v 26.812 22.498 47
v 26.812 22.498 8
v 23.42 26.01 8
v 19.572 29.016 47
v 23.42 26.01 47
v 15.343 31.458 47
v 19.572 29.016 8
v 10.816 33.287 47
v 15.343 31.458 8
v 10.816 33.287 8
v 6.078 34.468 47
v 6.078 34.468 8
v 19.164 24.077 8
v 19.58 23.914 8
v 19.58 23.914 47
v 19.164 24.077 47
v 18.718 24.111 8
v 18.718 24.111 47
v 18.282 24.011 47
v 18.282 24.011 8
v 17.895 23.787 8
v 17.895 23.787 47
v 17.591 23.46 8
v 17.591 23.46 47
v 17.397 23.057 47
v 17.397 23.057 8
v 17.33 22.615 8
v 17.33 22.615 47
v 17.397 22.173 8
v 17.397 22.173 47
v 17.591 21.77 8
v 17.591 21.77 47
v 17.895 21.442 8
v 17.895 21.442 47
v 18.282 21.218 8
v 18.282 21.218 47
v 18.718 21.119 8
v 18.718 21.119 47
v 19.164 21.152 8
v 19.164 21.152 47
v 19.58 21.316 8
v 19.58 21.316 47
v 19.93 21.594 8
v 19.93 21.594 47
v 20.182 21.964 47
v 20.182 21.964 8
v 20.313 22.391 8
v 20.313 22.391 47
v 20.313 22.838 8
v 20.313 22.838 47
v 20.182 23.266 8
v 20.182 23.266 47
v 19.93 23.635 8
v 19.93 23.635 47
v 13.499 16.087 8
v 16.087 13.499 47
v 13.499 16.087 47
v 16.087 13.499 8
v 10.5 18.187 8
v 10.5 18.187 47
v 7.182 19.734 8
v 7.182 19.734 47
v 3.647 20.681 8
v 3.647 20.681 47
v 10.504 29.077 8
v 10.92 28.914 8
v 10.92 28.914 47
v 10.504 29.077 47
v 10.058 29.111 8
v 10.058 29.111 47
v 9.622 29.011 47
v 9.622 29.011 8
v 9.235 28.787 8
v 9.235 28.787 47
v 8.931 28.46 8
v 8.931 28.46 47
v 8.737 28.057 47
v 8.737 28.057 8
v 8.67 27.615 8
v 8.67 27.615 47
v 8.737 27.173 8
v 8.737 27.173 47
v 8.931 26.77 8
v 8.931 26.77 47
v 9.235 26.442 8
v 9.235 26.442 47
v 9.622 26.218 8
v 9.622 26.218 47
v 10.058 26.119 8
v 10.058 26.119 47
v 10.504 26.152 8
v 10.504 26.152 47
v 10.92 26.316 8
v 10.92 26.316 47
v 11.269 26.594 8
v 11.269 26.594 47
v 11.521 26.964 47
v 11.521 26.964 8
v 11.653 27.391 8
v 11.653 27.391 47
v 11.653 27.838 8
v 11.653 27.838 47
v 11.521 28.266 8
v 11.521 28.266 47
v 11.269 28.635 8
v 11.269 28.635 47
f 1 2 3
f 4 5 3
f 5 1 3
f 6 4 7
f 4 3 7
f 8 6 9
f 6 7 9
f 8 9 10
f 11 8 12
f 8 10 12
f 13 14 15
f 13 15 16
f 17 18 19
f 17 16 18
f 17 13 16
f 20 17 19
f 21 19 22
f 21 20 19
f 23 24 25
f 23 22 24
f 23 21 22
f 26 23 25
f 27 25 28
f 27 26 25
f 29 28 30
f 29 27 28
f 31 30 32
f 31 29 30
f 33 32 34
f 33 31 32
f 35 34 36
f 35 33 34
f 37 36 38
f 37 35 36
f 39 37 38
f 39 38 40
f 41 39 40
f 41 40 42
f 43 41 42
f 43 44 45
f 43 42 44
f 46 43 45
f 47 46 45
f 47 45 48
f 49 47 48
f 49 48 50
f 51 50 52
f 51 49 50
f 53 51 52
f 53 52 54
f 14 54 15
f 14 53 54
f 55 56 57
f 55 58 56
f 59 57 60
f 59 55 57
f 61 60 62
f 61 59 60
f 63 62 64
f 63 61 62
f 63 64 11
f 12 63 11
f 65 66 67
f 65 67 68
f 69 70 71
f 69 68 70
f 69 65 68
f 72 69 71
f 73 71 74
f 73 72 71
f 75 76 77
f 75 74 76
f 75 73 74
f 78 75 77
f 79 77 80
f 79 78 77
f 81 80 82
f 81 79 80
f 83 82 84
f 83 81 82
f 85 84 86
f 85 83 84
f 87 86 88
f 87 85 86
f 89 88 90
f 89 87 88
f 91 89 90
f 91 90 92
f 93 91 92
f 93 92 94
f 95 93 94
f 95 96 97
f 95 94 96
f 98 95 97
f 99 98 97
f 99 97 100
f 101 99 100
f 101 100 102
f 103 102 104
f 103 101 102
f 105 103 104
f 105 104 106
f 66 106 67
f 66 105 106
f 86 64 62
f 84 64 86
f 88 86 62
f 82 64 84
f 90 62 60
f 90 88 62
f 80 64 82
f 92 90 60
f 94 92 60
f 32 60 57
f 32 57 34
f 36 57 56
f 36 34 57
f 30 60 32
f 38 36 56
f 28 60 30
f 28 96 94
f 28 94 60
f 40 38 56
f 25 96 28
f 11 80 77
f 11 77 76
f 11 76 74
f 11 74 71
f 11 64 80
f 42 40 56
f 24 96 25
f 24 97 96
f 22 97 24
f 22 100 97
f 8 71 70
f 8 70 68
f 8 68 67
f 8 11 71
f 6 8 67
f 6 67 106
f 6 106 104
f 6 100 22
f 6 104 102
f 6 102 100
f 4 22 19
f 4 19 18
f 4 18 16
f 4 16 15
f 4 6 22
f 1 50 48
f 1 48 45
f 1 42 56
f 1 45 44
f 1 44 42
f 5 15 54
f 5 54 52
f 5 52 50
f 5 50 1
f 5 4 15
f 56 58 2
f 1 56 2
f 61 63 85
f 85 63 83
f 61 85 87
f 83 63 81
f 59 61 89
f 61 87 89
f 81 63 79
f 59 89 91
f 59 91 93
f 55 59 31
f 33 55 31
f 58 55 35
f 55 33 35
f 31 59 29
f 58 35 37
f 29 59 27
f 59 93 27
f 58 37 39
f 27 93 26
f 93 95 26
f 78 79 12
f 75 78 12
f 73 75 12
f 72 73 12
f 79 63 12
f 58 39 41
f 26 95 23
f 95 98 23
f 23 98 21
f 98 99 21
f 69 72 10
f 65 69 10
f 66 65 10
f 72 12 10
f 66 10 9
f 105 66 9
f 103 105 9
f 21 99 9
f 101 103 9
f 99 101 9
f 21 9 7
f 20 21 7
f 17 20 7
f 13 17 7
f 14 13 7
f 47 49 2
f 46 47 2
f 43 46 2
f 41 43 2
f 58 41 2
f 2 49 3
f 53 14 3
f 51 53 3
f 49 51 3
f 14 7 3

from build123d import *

# Parameters (mm, degrees)
CYLINDER222_R               = 1.5
CYLINDER222_DEPTH           = 60
CYLINDER221_R               = 1.5
CYLINDER221_DEPTH           = 60
COMPOUND199_PLACEMENT_ANGLE = 60
BOX092_W                    = 50
BOX092_H                    = 50
BOX092_DEPTH                = 39
BOX092_PLACEMENT_ANGLE      = 80
BOX093_W                    = 50
BOX093_H                    = 50
BOX093_DEPTH                = 39
BOX093_PLACEMENT_ANGLE      = 50
BOX095_W                    = 50
BOX095_H                    = 100
BOX095_DEPTH                = 39
BOX095_PLACEMENT_ANGLE      = 150
BOX094_W                    = 50
BOX094_H                    = 100
BOX094_DEPTH                = 39
BOX094_PLACEMENT_ANGLE      = 240
TUBE017_R                   = 35
TUBE017_R_2                 = 21
TUBE017_DEPTH               = 39


with BuildPart() as v_lec222:
    # Cylinder222 → Cylinder222 (new body)
    with BuildSketch(Plane(origin=(29, -5, -6), x_dir=(1, 0, 0), z_dir=(0, 0, 1))):
        Circle(CYLINDER222_R)
    extrude(amount=CYLINDER222_DEPTH)


with BuildPart() as compound199:
    # Cylinder221 → Cylinder221 (new body)
    with BuildSketch(Plane(origin=(29, 5, -6), x_dir=(1, 0, 0), z_dir=(0, 0, 1))):
        Circle(CYLINDER221_R)
    extrude(amount=CYLINDER221_DEPTH)

    # Compound199: union Válec222
    add(v_lec222.part)


with BuildPart() as compound199_1:
    # Compound199 placement: moved
    add(compound199.part.rotate(Axis((0, 0, 0), (0, 0, 1)), COMPOUND199_PLACEMENT_ANGLE))


with BuildPart() as krychle092:
    # Box092 → Box092 (new body)
    with BuildSketch(Plane.XY):
        with Locations((25, 25)):
            Rectangle(BOX092_W, BOX092_H)
    extrude(amount=BOX092_DEPTH)


with BuildPart() as krychle092_1:
    # Box092 placement: moved
    add(krychle092.part.moved(Location((0, 0, 8))).rotate(Axis((0, 0, 8), (0, 0, 1)), BOX092_PLACEMENT_ANGLE))


with BuildPart() as krychle093:
    # Box093 → Box093 (new body)
    with BuildSketch(Plane.XY):
        with Locations((25, 25)):
            Rectangle(BOX093_W, BOX093_H)
    extrude(amount=BOX093_DEPTH)


with BuildPart() as krychle093_1:
    # Box093 placement: moved
    add(krychle093.part.moved(Location((0, 0, 8))).rotate(Axis((0, 0, 8), (0, 0, -1)), BOX093_PLACEMENT_ANGLE))


with BuildPart() as krychle095:
    # Box095 → Box095 (new body)
    with BuildSketch(Plane.XY):
        with Locations((25, 50)):
            Rectangle(BOX095_W, BOX095_H)
    extrude(amount=BOX095_DEPTH)


with BuildPart() as krychle095_1:
    # Box095 placement: moved
    add(krychle095.part.moved(Location((0, 0, 8))).rotate(Axis((0, 0, 8), (0, 0, 1)), BOX095_PLACEMENT_ANGLE))


with BuildPart() as krychle094:
    # Box094 → Box094 (new body)
    with BuildSketch(Plane.XY):
        with Locations((25, 50)):
            Rectangle(BOX094_W, BOX094_H)
    extrude(amount=BOX094_DEPTH)


with BuildPart() as krychle094_1:
    # Box094 placement: moved
    add(krychle094.part.moved(Location((0, 0, 8))).rotate(Axis((0, 0, 8), (0, 0, 1)), BOX094_PLACEMENT_ANGLE))


with BuildPart() as cut106:
    # Tube017 → Tube017 (new body)
    with BuildSketch(Plane.XY.offset(8)):
        Circle(TUBE017_R)
        Circle(TUBE017_R_2, mode=Mode.SUBTRACT)
    extrude(amount=TUBE017_DEPTH)

    # Cut102: cut Krychle094
    add(krychle094_1.part, mode=Mode.SUBTRACT)

    # Cut103: cut Krychle095
    add(krychle095_1.part, mode=Mode.SUBTRACT)

    # Cut104: cut Krychle093
    add(krychle093_1.part, mode=Mode.SUBTRACT)

    # Cut105: cut Krychle092
    add(krychle092_1.part, mode=Mode.SUBTRACT)

    # Cut106: cut Compound199
    add(compound199_1.part, mode=Mode.SUBTRACT)


solid = cut106.part
